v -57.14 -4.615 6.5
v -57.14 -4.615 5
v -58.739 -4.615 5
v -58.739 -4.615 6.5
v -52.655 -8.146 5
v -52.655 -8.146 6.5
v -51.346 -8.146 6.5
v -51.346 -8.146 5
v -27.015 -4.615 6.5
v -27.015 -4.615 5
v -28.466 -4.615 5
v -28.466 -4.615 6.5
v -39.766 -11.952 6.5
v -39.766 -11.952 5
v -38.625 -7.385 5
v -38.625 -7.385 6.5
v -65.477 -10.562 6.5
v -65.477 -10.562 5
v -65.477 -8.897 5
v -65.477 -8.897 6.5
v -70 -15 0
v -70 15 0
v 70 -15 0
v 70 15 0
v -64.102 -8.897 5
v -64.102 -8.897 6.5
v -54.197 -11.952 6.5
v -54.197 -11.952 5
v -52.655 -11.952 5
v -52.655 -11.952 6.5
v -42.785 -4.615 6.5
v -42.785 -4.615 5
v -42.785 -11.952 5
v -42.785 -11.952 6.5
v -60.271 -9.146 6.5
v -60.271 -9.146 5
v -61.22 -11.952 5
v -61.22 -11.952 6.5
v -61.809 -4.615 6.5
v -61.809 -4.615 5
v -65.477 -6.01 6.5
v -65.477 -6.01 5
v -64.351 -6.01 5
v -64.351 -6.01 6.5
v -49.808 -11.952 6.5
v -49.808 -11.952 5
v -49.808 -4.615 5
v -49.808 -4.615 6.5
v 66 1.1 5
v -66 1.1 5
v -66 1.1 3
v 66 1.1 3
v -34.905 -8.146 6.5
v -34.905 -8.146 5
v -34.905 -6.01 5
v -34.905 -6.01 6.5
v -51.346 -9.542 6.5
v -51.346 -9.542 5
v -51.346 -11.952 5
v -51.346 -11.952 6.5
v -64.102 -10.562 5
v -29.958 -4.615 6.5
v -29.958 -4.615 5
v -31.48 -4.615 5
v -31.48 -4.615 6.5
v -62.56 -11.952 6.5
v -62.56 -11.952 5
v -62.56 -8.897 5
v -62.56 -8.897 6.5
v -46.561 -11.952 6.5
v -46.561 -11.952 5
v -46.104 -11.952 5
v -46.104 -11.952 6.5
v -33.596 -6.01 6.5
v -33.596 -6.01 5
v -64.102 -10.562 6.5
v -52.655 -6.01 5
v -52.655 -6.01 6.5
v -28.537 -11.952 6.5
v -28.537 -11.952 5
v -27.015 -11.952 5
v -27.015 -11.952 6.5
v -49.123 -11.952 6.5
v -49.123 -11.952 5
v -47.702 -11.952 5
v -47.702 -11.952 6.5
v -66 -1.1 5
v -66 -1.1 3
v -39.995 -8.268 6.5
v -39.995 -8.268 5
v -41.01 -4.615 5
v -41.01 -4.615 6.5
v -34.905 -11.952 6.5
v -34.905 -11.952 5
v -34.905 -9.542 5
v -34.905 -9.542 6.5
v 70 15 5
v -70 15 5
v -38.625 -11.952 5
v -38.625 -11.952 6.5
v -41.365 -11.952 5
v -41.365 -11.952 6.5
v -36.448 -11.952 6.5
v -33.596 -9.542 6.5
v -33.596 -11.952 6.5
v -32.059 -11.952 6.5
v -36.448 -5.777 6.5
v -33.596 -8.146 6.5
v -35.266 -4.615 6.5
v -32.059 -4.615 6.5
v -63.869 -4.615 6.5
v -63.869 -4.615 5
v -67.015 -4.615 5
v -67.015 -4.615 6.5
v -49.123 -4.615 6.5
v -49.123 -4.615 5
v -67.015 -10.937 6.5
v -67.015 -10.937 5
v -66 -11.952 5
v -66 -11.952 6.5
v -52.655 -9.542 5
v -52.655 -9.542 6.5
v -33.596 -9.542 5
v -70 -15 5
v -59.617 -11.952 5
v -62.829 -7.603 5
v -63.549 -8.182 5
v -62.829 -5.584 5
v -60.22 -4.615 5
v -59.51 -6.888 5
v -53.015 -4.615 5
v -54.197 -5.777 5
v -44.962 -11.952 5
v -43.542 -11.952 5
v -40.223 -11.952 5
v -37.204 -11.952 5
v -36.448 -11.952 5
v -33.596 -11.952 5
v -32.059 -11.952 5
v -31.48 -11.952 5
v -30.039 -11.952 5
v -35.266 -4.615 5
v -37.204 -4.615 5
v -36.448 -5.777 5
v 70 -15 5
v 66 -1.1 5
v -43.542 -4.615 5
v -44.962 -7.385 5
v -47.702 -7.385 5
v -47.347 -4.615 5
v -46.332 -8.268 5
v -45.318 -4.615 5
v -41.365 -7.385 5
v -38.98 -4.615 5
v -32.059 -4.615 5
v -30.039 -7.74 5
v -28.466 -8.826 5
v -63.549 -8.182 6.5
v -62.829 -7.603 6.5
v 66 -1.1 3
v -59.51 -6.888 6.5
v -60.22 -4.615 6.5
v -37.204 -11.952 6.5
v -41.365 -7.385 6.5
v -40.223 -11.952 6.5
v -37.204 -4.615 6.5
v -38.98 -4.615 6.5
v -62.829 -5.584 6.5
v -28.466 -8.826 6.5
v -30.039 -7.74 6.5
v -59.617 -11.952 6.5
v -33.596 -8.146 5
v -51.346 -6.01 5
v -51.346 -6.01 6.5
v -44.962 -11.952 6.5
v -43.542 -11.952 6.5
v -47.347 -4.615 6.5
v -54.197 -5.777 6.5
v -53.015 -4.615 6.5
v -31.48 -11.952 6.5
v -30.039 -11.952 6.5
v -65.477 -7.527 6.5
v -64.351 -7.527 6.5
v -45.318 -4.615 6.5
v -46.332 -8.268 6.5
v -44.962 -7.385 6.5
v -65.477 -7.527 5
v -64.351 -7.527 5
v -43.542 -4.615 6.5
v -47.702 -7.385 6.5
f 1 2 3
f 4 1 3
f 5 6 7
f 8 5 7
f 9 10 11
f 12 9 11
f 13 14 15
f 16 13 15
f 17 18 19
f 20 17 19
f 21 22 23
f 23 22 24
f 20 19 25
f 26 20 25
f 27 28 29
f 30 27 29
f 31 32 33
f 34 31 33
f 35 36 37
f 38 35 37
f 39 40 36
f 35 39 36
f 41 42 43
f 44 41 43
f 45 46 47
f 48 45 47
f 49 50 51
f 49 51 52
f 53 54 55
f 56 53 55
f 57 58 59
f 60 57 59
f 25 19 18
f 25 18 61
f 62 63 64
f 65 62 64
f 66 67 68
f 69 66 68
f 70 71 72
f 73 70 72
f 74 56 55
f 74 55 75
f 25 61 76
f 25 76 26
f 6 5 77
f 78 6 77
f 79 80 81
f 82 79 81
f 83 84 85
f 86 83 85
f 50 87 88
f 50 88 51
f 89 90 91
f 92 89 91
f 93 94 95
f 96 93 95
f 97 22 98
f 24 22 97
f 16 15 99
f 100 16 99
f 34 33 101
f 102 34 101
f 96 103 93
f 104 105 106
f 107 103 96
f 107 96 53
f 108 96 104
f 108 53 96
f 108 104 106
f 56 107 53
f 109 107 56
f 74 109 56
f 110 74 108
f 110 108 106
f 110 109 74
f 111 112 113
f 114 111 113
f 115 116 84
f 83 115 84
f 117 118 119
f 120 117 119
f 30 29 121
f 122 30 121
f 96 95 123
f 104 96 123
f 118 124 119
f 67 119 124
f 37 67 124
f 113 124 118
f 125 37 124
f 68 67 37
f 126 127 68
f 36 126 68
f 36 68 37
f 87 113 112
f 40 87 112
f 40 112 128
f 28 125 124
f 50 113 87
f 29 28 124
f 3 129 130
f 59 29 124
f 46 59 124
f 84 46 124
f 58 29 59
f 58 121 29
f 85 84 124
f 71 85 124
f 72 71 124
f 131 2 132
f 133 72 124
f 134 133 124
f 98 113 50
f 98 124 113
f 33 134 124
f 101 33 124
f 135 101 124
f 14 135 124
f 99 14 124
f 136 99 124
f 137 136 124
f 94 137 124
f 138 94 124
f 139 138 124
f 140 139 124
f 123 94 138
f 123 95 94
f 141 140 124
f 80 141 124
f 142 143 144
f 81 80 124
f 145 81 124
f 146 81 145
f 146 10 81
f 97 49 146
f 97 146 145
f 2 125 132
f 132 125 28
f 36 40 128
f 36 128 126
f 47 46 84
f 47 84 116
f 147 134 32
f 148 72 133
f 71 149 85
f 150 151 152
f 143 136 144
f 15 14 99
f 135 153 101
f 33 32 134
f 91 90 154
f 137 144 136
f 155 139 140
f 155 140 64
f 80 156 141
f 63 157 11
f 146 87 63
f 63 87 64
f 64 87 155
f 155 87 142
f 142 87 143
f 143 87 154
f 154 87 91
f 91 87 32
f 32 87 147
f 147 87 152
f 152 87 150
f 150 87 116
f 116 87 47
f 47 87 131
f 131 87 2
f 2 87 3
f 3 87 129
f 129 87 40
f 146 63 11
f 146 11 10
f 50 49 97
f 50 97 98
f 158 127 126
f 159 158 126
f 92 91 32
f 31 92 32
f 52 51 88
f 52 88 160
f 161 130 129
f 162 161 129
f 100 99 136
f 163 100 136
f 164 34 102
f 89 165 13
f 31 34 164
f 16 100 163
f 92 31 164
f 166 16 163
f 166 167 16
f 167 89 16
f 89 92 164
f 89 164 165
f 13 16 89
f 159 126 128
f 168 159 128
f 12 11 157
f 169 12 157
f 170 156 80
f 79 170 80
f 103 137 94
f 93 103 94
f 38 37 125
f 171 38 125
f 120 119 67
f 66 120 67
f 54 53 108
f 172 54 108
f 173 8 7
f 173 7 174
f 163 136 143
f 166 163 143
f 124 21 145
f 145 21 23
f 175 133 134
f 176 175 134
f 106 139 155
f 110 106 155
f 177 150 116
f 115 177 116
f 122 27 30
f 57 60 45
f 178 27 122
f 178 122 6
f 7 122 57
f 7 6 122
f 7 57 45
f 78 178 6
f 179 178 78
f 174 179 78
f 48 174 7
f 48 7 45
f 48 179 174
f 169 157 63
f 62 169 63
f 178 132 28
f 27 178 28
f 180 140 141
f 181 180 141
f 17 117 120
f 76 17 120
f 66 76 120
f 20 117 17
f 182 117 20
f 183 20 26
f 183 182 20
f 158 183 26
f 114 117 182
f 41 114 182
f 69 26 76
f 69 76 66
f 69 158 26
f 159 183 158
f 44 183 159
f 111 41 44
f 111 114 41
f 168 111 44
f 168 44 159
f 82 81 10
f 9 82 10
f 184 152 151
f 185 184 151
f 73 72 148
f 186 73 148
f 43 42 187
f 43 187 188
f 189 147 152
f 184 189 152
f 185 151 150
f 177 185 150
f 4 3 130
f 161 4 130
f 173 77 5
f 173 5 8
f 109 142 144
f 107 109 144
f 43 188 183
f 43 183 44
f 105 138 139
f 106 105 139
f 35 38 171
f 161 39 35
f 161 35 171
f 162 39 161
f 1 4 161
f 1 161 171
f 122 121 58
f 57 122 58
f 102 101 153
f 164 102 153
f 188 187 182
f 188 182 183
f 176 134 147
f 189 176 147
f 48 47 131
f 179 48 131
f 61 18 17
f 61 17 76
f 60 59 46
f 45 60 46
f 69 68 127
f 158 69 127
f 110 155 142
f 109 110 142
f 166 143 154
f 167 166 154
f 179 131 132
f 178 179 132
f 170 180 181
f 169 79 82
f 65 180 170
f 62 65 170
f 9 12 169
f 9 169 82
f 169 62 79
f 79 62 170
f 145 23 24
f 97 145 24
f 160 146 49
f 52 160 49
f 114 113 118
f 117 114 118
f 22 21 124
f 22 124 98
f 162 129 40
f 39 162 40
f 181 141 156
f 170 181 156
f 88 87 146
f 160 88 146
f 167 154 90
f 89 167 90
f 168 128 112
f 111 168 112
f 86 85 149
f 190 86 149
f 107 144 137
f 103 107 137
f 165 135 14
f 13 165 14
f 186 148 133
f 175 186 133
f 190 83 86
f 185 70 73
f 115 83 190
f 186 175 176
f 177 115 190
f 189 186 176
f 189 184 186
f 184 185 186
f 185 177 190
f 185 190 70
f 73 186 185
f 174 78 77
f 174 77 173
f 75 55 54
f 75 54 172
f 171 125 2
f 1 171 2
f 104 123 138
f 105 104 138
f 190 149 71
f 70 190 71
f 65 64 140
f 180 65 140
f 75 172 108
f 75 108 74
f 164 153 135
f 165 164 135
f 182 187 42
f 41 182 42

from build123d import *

# Parameters (mm, degrees)
F0_W     = 140
F0_H     = 30
F1_DEPTH = 5
F2_W     = 132
F2_H     = 2.2
F3_DEPTH = 2
F4_W     = 1.375111
F4_H     = 1.664341
F4_W_2   = 1.126474
F4_H_2   = 1.517188
F4_W_3   = 1.309146
F4_H_3   = 2.136242
F5_DEPTH = 1.5


with BuildPart() as f1:
    # F0 (on Top) → F1 (new body)
    with BuildSketch(Plane.XY):
        Rectangle(F0_W, F0_H)
    extrude(amount=F1_DEPTH)

    # F2 (on face) → F3 (cut)
    with BuildSketch(Plane.XY.offset(5)):
        Rectangle(F2_W, F2_H)
    extrude(amount=-F3_DEPTH, mode=Mode.SUBTRACT)

    # F4 (on face) → F5 (join)
    with BuildSketch(Plane.XY.offset(5)):
        Polygon((-62.559685, -11.951999), (-62.559685, -8.897324), (-63.549156, -8.181861), (-62.828619, -7.603401), (-62.828619, -5.583865), (-63.868832, -4.614691), (-67.014842, -4.614691), (-67.014842, -10.937157), (-66, -11.951999), align=None)
        with Locations((-64.7898, -9.729494)):
            Rectangle(F4_W, F4_H, mode=Mode.SUBTRACT)
        with Locations((-64.914119, -6.768693)):
            Rectangle(F4_W_2, F4_H_2, mode=Mode.SUBTRACT)
        Polygon((-57.140429, -4.614691), (-58.738805, -4.614691), (-59.510085, -6.887937), (-60.220474, -4.614691), (-61.808702, -4.614691), (-60.271217, -9.145961), (-61.220094, -11.951999), (-59.616643, -11.951999), align=None)
        Polygon((-54.197387, -11.951999), (-52.654827, -11.951999), (-52.654827, -9.541749), (-51.345681, -9.541749), (-51.345681, -11.951999), (-49.808195, -11.951999), (-49.808195, -4.614691), (-53.015096, -4.614691), (-54.197387, -5.776685), align=None)
        with Locations((-52.000254, -7.07822)):
            Rectangle(F4_W_3, F4_H_3, mode=Mode.SUBTRACT)
        Polygon((-43.541545, -4.614691), (-45.317519, -4.614691), (-46.332361, -8.268122), (-47.347203, -4.614691), (-49.123176, -4.614691), (-49.123176, -11.951999), (-47.702398, -11.951999), (-47.702398, -7.38521), (-46.5607, -11.951999), (-46.104021, -11.951999), (-44.962324, -7.38521), (-44.962324, -11.951999), (-43.541545, -11.951999), align=None)
        Polygon((-37.203856, -4.614691), (-38.97983, -4.614691), (-39.994672, -8.268122), (-41.009514, -4.614691), (-42.785488, -4.614691), (-42.785488, -11.951999), (-41.364709, -11.951999), (-41.364709, -7.38521), (-40.223012, -11.951999), (-39.766333, -11.951999), (-38.624635, -7.38521), (-38.624635, -11.951999), (-37.203856, -11.951999), align=None)
        Polygon((-36.447799, -11.951999), (-34.905239, -11.951999), (-34.905239, -9.541749), (-33.596093, -9.541749), (-33.596093, -11.951999), (-32.058607, -11.951999), (-32.058607, -4.614691), (-35.265508, -4.614691), (-36.447799, -5.776685), align=None)
        with Locations((-34.250666, -7.07822)):
            Rectangle(F4_W_3, F4_H_3, mode=Mode.SUBTRACT)
        Polygon((-28.466066, -4.614691), (-28.466066, -8.826285), (-29.957884, -4.614691), (-31.480147, -4.614691), (-31.480147, -11.951999), (-30.039071, -11.951999), (-30.039071, -7.740404), (-28.537105, -11.951999), (-27.014842, -11.951999), (-27.014842, -4.614691), align=None)
    extrude(amount=F5_DEPTH)


solid = f1.part
